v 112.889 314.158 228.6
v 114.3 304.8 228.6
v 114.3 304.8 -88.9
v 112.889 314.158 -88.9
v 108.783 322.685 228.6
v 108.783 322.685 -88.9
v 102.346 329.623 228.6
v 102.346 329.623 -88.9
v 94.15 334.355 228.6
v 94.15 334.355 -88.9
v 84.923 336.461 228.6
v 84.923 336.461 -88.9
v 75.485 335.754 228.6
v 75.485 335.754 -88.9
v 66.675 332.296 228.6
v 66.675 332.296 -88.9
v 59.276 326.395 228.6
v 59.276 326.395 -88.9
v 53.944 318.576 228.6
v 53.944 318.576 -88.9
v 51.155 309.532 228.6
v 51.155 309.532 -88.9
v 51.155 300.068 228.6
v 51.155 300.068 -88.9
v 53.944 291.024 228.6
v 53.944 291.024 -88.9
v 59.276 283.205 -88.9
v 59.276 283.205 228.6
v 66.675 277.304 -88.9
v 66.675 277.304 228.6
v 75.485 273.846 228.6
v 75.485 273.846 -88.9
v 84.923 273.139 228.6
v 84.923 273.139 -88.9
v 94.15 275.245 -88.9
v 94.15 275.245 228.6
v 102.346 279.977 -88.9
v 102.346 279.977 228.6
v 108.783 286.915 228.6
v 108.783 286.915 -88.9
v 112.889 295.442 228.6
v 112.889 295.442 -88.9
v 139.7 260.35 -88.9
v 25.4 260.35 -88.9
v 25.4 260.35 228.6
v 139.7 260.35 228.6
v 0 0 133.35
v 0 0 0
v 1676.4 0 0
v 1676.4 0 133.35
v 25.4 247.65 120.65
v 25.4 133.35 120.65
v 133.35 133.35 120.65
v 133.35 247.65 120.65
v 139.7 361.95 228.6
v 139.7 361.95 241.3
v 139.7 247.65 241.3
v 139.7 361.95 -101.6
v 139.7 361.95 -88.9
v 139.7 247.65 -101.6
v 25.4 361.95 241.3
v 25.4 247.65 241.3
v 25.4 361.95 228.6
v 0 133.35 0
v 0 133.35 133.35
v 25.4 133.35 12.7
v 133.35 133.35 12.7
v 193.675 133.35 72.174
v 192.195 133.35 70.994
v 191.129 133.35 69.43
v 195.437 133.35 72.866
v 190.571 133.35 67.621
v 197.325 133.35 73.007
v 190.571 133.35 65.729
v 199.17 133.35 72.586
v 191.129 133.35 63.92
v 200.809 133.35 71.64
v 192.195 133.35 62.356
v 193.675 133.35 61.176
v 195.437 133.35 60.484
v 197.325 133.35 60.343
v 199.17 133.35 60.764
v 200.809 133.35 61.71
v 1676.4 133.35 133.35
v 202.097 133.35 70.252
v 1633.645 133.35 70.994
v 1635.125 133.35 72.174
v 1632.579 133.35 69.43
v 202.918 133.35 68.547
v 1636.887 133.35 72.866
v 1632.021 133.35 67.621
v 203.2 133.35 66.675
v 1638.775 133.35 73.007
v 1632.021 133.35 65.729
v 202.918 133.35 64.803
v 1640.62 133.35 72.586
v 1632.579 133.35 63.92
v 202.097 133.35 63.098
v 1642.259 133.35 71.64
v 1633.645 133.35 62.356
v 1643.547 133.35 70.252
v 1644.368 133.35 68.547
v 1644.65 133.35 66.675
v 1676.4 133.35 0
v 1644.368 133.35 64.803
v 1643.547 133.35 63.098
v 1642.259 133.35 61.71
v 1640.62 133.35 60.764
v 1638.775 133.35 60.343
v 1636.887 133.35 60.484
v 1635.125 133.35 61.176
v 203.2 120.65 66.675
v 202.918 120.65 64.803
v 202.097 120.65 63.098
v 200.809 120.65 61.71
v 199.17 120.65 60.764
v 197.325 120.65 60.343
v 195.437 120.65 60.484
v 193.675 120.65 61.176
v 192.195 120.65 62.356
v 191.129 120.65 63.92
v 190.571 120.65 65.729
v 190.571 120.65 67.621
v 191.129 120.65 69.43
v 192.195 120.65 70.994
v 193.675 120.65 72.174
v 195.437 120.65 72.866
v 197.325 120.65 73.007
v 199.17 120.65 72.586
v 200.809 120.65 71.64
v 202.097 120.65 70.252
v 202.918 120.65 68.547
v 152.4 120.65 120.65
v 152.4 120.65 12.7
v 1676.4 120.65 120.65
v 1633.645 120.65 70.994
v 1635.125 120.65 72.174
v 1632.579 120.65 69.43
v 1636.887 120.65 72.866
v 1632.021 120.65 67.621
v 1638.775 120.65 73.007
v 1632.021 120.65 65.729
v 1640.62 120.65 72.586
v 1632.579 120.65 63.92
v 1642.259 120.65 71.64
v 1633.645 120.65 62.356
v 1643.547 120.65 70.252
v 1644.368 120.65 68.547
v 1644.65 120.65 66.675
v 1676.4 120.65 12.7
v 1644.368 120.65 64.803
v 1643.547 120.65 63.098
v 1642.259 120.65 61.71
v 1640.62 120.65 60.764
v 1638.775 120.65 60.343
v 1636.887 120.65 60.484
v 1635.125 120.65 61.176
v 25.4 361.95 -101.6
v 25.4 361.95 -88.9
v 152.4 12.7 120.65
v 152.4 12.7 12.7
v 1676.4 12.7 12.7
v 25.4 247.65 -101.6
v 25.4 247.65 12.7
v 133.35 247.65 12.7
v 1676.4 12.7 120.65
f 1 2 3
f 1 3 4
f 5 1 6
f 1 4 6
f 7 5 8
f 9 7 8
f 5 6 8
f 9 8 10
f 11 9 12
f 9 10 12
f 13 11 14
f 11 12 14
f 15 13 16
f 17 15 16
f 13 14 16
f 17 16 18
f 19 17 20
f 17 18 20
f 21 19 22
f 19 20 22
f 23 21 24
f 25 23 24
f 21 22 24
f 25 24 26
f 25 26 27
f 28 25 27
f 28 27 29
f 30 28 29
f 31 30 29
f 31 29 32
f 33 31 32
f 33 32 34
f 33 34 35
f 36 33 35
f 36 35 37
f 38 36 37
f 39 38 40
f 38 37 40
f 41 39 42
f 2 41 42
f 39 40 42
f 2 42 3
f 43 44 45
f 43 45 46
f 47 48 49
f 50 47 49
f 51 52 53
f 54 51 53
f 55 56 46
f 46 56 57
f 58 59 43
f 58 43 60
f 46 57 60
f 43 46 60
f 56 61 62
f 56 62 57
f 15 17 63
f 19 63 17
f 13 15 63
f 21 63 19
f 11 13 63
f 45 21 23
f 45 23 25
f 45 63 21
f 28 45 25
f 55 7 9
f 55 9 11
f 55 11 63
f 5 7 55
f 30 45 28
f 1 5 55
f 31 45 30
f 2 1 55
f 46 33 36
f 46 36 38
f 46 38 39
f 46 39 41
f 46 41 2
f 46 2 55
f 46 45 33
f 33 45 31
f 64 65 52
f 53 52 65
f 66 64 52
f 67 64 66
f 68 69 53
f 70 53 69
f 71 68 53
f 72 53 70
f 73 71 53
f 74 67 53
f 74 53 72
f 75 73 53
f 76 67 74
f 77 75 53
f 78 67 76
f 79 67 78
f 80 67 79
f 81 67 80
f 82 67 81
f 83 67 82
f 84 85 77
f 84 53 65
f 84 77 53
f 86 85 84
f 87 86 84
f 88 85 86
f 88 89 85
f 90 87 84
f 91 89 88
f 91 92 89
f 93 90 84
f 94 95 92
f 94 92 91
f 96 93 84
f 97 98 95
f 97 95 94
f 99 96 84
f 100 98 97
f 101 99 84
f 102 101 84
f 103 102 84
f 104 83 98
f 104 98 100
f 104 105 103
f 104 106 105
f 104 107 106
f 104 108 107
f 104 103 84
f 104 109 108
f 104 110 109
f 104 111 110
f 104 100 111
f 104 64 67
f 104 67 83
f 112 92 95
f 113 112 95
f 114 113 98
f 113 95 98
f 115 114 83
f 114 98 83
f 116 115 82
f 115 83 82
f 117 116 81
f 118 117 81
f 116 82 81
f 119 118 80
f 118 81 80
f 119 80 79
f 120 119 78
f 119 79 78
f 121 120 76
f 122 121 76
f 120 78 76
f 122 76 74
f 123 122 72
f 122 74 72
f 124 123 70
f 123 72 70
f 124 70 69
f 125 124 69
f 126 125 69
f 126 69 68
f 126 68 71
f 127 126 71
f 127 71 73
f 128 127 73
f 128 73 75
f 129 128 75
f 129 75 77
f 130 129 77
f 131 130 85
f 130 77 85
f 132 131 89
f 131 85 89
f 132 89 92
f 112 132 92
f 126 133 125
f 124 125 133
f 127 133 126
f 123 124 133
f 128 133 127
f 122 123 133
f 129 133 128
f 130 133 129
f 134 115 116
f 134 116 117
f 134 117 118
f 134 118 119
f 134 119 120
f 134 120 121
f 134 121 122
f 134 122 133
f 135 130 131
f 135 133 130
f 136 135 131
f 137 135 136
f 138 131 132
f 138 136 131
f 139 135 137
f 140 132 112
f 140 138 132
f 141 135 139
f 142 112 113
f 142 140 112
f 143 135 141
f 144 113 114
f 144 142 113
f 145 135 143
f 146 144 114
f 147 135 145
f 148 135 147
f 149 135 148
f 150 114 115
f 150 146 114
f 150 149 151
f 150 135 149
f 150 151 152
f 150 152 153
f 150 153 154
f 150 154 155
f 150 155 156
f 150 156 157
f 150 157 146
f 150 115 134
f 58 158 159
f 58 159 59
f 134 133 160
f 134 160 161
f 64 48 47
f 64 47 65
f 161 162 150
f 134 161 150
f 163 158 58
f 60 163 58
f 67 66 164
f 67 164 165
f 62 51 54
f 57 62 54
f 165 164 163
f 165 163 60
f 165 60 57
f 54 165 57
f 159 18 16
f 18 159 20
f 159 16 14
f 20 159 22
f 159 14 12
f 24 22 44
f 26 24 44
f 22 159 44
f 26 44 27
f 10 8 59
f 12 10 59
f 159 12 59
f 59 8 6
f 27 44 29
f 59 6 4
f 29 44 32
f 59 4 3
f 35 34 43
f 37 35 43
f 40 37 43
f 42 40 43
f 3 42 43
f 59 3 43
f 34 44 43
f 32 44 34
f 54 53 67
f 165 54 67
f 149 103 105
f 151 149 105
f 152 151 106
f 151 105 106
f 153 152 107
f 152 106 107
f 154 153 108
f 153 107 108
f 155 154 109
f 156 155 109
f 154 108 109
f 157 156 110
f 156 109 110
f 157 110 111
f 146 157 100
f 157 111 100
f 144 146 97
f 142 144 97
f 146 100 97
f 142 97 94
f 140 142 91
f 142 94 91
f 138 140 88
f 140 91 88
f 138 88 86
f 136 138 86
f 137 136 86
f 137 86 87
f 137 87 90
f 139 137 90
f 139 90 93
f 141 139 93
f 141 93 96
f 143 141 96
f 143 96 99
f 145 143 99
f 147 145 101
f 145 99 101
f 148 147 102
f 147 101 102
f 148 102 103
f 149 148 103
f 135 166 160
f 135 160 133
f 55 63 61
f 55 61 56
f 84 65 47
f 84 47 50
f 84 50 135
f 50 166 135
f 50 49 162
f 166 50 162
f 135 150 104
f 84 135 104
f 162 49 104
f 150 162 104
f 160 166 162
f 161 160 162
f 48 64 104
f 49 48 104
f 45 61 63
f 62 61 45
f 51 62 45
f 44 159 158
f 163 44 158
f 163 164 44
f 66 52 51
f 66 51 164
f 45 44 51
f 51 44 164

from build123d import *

# Parameters (mm, degrees)
SKETCH1_W           = 1676.4
SKETCH1_H           = 133.35
BOSS_EXTRUDE1_DEPTH = 133.35
SKETCH2_W           = 107.95
SKETCH2_H           = 107.95
CUT_EXTRUDE1_DEPTH  = 1524
SKETCH3_W           = 107.95
SKETCH3_H           = 107.95
BOSS_EXTRUDE2_DEPTH = 114.3
SKETCH4_W           = 114.3
SKETCH4_H           = 342.9
BOSS_EXTRUDE3_DEPTH = 12.7
SKETCH5_W           = 114.3
SKETCH5_H           = 12.7
BOSS_EXTRUDE4_DEPTH = 101.6
SKETCH6_R           = 31.75
BOSS_EXTRUDE5_DEPTH = 317.5
SKETCH7_R           = 6.35
CUT_EXTRUDE2_DEPTH  = 12.7


with BuildPart() as part:
    # Sketch1 → Boss-Extrude1 (new body)
    with BuildSketch(Plane.XY):
        with Locations((838.2, 66.675)):
            Rectangle(SKETCH1_W, SKETCH1_H)
    extrude(amount=BOSS_EXTRUDE1_DEPTH)

    # Sketch2 → Cut-Extrude1 (cut)
    with BuildSketch(Plane(origin=(1676.4, 0, 0), x_dir=(0, 0, -1), z_dir=(1, 0, 0))):
        with Locations((-66.675, 66.675)):
            Rectangle(SKETCH2_W, SKETCH2_H)
    extrude(amount=-CUT_EXTRUDE1_DEPTH, mode=Mode.SUBTRACT)

    # Sketch3 → Boss-Extrude2 (add)
    with BuildSketch(Plane(origin=(0, 133.35, 0), x_dir=(1, 0, 0), z_dir=(0, 1, 0))):
        with Locations((79.375, -66.675)):
            Rectangle(SKETCH3_W, SKETCH3_H)
    extrude(amount=BOSS_EXTRUDE2_DEPTH)

    # Sketch4 → Boss-Extrude3 (add)
    with BuildSketch(Plane(origin=(0, 247.65, 0), x_dir=(1, 0, 0), z_dir=(0, 1, 0))):
        with Locations((82.55, -69.85)):
            Rectangle(SKETCH4_W, SKETCH4_H)
    extrude(amount=BOSS_EXTRUDE3_DEPTH)

    # Sketch5 → Boss-Extrude4 (add)
    with BuildSketch(Plane(origin=(0, 260.35, 0), x_dir=(1, 0, 0), z_dir=(0, 1, 0))):
        with Locations((82.55, 95.25)):
            Rectangle(SKETCH5_W, SKETCH5_H)
        with Locations((82.55, -234.95)):
            Rectangle(SKETCH5_W, SKETCH5_H)
    extrude(amount=BOSS_EXTRUDE4_DEPTH)

    # Sketch6 → Boss-Extrude5 (add)
    with BuildSketch(Plane.XY.offset(-88.9)):
        with Locations((82.55, 304.8)):
            Circle(SKETCH6_R)
    extrude(amount=BOSS_EXTRUDE5_DEPTH)

    # Sketch7 → Cut-Extrude2 (cut)
    with BuildSketch(Plane(origin=(0, 133.35, 0), x_dir=(1, 0, 0), z_dir=(0, 1, 0))):
        with Locations((196.85, -66.675)):
            Circle(SKETCH7_R)
        with Locations((1638.3, -66.675)):
            Circle(SKETCH7_R)
    extrude(amount=-CUT_EXTRUDE2_DEPTH, mode=Mode.SUBTRACT)


solid = part.part
